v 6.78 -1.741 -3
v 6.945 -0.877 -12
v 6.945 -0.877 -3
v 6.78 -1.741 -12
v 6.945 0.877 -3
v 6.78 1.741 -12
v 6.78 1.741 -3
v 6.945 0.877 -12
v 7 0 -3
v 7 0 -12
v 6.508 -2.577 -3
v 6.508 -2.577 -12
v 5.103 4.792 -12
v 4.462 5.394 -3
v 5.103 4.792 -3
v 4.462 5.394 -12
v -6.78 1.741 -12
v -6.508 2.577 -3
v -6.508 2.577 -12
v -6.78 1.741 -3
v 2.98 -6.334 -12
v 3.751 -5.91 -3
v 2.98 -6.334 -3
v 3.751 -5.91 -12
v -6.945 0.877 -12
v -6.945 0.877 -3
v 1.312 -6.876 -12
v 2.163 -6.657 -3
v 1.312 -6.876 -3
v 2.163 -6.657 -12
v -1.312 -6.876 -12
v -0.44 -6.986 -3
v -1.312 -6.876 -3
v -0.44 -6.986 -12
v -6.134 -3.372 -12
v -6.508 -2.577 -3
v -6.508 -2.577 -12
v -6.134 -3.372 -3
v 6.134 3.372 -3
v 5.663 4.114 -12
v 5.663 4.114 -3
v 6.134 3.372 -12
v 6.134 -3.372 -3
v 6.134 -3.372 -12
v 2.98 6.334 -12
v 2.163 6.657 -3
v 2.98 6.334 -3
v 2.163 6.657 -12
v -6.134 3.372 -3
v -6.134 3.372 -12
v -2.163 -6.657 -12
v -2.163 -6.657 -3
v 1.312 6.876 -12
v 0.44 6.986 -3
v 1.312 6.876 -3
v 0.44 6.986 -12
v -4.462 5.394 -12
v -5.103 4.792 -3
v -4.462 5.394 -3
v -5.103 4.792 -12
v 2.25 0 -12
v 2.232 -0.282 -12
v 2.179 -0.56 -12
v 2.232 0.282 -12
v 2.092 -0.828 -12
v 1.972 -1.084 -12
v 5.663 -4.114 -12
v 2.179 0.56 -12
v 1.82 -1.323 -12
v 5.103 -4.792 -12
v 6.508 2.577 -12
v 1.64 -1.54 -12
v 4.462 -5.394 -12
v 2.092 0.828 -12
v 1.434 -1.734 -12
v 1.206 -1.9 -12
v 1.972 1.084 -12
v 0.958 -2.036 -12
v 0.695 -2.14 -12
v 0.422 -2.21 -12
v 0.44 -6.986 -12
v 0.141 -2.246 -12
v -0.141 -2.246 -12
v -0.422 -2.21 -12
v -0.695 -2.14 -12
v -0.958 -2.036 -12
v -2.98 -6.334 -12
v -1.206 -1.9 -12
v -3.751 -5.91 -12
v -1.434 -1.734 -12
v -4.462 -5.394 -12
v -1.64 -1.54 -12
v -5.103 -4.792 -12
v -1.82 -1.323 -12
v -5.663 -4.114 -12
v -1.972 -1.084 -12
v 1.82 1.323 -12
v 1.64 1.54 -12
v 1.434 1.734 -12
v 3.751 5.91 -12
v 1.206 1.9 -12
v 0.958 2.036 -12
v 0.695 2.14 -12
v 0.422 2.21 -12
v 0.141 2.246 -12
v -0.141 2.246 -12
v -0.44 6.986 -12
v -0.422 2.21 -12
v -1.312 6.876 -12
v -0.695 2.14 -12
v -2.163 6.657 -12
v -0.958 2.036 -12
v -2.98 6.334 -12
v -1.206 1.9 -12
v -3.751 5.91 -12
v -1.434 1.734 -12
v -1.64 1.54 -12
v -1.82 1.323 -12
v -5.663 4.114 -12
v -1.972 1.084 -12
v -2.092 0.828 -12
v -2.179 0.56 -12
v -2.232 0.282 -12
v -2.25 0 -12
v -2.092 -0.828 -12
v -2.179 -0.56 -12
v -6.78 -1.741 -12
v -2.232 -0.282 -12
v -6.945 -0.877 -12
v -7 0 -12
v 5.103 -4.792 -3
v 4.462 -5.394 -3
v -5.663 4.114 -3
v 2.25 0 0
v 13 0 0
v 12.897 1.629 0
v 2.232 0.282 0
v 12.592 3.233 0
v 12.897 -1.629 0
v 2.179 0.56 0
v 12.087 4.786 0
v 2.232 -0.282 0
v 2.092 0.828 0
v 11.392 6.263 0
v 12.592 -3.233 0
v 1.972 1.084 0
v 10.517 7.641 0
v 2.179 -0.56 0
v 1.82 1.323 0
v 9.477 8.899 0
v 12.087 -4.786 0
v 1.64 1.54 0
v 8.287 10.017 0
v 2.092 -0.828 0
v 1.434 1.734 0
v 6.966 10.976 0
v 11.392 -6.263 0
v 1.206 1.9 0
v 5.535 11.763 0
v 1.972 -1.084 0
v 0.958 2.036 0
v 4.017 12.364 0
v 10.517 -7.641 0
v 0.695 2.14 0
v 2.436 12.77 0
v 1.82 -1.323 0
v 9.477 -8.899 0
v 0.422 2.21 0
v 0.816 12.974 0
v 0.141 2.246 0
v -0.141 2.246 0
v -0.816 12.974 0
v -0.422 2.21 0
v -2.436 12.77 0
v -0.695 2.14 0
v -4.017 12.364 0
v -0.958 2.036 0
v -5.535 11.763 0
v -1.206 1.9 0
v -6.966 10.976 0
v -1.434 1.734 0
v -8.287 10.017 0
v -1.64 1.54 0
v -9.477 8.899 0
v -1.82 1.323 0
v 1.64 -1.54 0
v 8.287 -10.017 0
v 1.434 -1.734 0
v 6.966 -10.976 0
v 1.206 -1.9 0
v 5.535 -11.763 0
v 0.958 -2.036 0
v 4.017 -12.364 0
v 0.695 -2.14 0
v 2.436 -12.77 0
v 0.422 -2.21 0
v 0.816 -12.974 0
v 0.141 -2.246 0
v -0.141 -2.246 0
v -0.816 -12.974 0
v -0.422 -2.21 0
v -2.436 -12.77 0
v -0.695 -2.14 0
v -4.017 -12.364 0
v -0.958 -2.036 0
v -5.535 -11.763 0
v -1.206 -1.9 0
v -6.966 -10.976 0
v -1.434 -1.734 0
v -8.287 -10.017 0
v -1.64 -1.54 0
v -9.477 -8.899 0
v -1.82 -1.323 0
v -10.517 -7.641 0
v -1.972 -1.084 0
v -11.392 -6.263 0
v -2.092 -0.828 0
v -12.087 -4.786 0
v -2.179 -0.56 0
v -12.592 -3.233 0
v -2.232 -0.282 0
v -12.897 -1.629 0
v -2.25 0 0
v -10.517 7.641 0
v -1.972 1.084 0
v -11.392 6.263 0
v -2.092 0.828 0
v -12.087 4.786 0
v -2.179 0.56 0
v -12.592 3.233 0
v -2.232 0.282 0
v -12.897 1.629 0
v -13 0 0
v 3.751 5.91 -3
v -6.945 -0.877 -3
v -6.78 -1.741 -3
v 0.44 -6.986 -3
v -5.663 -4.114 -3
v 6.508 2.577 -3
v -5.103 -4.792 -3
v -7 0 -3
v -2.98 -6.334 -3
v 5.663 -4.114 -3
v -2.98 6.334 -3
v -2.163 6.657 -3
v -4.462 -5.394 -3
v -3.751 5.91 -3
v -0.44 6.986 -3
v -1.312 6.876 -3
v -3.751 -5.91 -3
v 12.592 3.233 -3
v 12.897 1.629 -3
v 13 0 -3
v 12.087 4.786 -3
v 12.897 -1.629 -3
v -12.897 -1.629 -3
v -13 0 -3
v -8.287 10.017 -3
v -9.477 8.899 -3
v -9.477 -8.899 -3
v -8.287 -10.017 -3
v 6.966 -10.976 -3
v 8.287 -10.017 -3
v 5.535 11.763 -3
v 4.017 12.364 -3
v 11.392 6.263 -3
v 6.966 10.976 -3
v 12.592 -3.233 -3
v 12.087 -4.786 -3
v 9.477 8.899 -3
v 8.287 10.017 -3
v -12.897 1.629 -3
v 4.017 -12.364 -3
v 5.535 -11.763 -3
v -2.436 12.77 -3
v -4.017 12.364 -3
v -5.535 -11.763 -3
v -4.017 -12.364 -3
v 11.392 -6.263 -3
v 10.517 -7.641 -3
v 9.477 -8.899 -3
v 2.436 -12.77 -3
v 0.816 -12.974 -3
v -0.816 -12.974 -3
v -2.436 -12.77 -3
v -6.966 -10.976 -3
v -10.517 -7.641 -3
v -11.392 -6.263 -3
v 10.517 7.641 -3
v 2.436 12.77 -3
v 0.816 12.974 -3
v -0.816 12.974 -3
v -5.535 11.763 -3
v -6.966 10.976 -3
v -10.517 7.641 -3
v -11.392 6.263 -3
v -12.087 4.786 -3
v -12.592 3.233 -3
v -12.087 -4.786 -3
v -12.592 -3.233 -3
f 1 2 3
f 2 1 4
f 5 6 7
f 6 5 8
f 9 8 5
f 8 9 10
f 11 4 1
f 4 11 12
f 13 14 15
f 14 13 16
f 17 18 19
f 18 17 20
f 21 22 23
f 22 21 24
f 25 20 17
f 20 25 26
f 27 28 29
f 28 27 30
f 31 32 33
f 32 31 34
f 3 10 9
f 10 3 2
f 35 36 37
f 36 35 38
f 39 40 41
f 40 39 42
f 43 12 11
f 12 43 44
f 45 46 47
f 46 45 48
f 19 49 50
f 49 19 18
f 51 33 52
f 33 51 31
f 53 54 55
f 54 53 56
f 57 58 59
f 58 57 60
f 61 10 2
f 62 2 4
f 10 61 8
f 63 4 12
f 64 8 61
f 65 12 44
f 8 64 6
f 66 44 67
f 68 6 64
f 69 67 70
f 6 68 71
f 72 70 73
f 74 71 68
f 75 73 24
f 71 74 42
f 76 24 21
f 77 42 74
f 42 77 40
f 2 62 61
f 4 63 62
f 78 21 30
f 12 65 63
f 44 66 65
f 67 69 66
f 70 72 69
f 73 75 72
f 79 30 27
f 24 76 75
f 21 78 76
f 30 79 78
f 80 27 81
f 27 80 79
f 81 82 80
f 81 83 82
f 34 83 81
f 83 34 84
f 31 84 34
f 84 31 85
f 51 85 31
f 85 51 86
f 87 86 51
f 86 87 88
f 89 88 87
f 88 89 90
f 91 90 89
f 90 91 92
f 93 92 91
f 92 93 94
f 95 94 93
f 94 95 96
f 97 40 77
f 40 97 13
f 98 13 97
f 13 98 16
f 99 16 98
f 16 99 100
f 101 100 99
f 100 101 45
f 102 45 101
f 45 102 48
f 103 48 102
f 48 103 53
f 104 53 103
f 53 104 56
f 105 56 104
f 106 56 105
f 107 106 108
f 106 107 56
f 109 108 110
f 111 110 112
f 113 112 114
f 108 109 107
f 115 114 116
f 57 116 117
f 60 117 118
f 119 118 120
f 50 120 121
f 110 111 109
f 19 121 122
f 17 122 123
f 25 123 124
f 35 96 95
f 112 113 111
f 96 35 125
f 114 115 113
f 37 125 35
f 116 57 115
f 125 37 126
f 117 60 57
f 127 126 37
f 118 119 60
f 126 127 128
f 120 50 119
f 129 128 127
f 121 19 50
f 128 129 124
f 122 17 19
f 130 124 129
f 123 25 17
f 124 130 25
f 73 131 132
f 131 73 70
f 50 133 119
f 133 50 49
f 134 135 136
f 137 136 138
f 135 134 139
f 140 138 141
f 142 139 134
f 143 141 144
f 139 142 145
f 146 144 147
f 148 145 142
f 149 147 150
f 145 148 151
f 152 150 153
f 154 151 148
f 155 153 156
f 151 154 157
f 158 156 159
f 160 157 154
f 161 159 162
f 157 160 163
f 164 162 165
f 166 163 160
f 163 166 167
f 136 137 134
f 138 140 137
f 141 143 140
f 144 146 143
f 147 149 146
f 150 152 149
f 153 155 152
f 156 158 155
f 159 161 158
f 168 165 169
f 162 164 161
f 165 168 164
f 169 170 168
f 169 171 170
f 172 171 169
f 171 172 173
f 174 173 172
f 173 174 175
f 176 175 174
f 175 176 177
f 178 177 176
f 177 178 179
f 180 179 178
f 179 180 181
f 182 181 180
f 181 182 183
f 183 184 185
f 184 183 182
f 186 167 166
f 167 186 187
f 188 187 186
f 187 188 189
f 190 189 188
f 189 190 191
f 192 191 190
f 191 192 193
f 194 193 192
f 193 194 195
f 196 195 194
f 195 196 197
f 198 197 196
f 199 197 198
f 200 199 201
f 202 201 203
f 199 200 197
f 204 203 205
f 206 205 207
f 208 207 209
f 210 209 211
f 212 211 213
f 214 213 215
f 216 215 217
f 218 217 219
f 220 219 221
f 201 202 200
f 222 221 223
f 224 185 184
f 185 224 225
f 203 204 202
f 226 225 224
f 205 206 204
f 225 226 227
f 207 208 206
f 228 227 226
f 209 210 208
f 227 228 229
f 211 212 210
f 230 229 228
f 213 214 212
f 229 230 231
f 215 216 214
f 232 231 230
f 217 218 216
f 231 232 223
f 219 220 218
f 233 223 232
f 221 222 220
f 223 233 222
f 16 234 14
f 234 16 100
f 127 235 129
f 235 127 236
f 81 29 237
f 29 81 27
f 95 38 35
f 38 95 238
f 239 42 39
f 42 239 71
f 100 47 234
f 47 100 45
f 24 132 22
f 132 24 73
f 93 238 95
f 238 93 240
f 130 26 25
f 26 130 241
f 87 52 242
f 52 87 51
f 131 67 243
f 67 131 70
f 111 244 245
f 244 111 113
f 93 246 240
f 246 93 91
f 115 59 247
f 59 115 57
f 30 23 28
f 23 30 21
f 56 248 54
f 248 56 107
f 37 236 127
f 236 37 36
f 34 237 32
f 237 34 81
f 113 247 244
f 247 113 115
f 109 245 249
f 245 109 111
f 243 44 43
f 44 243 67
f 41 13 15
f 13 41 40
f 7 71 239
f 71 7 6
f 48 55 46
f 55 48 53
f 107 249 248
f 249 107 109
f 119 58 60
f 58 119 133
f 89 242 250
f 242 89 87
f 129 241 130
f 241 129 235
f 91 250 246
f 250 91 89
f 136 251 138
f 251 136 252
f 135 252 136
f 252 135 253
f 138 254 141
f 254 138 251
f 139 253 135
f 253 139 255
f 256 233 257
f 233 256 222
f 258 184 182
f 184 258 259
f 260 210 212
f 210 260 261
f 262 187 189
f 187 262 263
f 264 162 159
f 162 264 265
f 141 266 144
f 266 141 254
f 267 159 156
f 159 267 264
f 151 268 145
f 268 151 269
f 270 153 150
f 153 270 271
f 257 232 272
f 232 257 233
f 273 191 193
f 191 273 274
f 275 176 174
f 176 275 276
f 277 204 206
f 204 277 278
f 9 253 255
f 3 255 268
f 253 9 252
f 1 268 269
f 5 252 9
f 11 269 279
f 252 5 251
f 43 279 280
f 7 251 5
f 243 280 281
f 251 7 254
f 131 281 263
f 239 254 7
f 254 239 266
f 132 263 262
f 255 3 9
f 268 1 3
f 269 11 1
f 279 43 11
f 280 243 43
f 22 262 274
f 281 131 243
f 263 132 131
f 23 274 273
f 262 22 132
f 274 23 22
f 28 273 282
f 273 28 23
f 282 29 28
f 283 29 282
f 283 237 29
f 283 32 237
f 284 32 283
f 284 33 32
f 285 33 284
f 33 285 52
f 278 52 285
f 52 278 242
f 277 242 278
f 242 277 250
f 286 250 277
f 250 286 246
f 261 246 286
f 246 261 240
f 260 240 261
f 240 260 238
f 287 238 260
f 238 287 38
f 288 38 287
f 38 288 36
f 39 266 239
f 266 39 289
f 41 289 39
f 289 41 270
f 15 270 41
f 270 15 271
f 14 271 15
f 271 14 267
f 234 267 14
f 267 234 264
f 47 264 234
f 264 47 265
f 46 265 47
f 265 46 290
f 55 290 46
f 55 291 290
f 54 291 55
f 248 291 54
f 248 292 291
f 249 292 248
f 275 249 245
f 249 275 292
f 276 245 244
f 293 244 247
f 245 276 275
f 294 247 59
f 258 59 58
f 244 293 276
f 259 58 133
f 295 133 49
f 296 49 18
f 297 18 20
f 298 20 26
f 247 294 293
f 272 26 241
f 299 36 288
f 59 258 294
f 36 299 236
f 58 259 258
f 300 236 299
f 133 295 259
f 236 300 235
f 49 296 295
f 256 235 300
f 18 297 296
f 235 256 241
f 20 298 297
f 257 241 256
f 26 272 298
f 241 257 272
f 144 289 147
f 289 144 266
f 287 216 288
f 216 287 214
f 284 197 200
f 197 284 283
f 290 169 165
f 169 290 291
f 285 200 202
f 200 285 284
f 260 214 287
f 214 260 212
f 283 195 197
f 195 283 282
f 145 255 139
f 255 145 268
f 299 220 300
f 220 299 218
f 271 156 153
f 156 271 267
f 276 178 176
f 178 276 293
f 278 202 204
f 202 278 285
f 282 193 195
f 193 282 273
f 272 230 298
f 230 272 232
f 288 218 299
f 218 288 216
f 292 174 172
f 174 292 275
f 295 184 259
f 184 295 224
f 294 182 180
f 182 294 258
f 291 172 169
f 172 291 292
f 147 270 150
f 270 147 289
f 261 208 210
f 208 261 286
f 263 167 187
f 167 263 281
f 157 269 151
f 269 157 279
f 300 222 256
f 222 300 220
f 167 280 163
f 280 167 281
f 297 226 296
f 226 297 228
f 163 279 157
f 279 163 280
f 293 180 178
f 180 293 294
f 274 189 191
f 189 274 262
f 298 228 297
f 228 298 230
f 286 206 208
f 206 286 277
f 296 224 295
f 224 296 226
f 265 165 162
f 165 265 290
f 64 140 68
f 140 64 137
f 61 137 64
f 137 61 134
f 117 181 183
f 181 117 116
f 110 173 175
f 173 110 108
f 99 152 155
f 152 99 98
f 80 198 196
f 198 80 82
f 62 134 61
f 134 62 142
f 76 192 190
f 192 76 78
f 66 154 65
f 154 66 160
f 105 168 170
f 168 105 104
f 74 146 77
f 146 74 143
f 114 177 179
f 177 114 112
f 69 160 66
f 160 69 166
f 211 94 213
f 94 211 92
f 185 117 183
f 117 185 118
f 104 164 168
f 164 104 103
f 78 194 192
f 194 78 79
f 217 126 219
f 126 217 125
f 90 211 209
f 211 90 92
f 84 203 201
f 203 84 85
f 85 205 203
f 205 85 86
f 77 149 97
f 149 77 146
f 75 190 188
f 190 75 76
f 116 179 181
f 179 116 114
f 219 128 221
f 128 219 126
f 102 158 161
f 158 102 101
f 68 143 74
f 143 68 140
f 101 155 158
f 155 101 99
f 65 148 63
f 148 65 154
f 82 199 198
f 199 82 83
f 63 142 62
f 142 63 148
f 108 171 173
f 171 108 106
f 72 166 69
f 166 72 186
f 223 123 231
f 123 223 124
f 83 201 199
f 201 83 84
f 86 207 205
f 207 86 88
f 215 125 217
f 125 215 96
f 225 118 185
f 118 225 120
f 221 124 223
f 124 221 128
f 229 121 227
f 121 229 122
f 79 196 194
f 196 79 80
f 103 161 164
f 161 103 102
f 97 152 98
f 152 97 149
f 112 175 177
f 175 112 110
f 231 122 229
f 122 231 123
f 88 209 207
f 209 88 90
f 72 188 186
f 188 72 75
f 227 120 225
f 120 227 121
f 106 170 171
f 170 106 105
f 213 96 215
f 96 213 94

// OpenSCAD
$fn = 50;


difference() {
	union() {
		translate(v = [0, 0, -12.0000000000]) {
			cylinder(h = 12, r = 7.0000000000);
		}
		translate(v = [0, 0, -3.0000000000]) {
			cylinder(h = 3, r = 13.0000000000);
		}
	}
	union() {
		#translate(v = [0, 0, -12]) {
			cylinder(h = 12, r = 2.2500000000);
		}
	}
}
